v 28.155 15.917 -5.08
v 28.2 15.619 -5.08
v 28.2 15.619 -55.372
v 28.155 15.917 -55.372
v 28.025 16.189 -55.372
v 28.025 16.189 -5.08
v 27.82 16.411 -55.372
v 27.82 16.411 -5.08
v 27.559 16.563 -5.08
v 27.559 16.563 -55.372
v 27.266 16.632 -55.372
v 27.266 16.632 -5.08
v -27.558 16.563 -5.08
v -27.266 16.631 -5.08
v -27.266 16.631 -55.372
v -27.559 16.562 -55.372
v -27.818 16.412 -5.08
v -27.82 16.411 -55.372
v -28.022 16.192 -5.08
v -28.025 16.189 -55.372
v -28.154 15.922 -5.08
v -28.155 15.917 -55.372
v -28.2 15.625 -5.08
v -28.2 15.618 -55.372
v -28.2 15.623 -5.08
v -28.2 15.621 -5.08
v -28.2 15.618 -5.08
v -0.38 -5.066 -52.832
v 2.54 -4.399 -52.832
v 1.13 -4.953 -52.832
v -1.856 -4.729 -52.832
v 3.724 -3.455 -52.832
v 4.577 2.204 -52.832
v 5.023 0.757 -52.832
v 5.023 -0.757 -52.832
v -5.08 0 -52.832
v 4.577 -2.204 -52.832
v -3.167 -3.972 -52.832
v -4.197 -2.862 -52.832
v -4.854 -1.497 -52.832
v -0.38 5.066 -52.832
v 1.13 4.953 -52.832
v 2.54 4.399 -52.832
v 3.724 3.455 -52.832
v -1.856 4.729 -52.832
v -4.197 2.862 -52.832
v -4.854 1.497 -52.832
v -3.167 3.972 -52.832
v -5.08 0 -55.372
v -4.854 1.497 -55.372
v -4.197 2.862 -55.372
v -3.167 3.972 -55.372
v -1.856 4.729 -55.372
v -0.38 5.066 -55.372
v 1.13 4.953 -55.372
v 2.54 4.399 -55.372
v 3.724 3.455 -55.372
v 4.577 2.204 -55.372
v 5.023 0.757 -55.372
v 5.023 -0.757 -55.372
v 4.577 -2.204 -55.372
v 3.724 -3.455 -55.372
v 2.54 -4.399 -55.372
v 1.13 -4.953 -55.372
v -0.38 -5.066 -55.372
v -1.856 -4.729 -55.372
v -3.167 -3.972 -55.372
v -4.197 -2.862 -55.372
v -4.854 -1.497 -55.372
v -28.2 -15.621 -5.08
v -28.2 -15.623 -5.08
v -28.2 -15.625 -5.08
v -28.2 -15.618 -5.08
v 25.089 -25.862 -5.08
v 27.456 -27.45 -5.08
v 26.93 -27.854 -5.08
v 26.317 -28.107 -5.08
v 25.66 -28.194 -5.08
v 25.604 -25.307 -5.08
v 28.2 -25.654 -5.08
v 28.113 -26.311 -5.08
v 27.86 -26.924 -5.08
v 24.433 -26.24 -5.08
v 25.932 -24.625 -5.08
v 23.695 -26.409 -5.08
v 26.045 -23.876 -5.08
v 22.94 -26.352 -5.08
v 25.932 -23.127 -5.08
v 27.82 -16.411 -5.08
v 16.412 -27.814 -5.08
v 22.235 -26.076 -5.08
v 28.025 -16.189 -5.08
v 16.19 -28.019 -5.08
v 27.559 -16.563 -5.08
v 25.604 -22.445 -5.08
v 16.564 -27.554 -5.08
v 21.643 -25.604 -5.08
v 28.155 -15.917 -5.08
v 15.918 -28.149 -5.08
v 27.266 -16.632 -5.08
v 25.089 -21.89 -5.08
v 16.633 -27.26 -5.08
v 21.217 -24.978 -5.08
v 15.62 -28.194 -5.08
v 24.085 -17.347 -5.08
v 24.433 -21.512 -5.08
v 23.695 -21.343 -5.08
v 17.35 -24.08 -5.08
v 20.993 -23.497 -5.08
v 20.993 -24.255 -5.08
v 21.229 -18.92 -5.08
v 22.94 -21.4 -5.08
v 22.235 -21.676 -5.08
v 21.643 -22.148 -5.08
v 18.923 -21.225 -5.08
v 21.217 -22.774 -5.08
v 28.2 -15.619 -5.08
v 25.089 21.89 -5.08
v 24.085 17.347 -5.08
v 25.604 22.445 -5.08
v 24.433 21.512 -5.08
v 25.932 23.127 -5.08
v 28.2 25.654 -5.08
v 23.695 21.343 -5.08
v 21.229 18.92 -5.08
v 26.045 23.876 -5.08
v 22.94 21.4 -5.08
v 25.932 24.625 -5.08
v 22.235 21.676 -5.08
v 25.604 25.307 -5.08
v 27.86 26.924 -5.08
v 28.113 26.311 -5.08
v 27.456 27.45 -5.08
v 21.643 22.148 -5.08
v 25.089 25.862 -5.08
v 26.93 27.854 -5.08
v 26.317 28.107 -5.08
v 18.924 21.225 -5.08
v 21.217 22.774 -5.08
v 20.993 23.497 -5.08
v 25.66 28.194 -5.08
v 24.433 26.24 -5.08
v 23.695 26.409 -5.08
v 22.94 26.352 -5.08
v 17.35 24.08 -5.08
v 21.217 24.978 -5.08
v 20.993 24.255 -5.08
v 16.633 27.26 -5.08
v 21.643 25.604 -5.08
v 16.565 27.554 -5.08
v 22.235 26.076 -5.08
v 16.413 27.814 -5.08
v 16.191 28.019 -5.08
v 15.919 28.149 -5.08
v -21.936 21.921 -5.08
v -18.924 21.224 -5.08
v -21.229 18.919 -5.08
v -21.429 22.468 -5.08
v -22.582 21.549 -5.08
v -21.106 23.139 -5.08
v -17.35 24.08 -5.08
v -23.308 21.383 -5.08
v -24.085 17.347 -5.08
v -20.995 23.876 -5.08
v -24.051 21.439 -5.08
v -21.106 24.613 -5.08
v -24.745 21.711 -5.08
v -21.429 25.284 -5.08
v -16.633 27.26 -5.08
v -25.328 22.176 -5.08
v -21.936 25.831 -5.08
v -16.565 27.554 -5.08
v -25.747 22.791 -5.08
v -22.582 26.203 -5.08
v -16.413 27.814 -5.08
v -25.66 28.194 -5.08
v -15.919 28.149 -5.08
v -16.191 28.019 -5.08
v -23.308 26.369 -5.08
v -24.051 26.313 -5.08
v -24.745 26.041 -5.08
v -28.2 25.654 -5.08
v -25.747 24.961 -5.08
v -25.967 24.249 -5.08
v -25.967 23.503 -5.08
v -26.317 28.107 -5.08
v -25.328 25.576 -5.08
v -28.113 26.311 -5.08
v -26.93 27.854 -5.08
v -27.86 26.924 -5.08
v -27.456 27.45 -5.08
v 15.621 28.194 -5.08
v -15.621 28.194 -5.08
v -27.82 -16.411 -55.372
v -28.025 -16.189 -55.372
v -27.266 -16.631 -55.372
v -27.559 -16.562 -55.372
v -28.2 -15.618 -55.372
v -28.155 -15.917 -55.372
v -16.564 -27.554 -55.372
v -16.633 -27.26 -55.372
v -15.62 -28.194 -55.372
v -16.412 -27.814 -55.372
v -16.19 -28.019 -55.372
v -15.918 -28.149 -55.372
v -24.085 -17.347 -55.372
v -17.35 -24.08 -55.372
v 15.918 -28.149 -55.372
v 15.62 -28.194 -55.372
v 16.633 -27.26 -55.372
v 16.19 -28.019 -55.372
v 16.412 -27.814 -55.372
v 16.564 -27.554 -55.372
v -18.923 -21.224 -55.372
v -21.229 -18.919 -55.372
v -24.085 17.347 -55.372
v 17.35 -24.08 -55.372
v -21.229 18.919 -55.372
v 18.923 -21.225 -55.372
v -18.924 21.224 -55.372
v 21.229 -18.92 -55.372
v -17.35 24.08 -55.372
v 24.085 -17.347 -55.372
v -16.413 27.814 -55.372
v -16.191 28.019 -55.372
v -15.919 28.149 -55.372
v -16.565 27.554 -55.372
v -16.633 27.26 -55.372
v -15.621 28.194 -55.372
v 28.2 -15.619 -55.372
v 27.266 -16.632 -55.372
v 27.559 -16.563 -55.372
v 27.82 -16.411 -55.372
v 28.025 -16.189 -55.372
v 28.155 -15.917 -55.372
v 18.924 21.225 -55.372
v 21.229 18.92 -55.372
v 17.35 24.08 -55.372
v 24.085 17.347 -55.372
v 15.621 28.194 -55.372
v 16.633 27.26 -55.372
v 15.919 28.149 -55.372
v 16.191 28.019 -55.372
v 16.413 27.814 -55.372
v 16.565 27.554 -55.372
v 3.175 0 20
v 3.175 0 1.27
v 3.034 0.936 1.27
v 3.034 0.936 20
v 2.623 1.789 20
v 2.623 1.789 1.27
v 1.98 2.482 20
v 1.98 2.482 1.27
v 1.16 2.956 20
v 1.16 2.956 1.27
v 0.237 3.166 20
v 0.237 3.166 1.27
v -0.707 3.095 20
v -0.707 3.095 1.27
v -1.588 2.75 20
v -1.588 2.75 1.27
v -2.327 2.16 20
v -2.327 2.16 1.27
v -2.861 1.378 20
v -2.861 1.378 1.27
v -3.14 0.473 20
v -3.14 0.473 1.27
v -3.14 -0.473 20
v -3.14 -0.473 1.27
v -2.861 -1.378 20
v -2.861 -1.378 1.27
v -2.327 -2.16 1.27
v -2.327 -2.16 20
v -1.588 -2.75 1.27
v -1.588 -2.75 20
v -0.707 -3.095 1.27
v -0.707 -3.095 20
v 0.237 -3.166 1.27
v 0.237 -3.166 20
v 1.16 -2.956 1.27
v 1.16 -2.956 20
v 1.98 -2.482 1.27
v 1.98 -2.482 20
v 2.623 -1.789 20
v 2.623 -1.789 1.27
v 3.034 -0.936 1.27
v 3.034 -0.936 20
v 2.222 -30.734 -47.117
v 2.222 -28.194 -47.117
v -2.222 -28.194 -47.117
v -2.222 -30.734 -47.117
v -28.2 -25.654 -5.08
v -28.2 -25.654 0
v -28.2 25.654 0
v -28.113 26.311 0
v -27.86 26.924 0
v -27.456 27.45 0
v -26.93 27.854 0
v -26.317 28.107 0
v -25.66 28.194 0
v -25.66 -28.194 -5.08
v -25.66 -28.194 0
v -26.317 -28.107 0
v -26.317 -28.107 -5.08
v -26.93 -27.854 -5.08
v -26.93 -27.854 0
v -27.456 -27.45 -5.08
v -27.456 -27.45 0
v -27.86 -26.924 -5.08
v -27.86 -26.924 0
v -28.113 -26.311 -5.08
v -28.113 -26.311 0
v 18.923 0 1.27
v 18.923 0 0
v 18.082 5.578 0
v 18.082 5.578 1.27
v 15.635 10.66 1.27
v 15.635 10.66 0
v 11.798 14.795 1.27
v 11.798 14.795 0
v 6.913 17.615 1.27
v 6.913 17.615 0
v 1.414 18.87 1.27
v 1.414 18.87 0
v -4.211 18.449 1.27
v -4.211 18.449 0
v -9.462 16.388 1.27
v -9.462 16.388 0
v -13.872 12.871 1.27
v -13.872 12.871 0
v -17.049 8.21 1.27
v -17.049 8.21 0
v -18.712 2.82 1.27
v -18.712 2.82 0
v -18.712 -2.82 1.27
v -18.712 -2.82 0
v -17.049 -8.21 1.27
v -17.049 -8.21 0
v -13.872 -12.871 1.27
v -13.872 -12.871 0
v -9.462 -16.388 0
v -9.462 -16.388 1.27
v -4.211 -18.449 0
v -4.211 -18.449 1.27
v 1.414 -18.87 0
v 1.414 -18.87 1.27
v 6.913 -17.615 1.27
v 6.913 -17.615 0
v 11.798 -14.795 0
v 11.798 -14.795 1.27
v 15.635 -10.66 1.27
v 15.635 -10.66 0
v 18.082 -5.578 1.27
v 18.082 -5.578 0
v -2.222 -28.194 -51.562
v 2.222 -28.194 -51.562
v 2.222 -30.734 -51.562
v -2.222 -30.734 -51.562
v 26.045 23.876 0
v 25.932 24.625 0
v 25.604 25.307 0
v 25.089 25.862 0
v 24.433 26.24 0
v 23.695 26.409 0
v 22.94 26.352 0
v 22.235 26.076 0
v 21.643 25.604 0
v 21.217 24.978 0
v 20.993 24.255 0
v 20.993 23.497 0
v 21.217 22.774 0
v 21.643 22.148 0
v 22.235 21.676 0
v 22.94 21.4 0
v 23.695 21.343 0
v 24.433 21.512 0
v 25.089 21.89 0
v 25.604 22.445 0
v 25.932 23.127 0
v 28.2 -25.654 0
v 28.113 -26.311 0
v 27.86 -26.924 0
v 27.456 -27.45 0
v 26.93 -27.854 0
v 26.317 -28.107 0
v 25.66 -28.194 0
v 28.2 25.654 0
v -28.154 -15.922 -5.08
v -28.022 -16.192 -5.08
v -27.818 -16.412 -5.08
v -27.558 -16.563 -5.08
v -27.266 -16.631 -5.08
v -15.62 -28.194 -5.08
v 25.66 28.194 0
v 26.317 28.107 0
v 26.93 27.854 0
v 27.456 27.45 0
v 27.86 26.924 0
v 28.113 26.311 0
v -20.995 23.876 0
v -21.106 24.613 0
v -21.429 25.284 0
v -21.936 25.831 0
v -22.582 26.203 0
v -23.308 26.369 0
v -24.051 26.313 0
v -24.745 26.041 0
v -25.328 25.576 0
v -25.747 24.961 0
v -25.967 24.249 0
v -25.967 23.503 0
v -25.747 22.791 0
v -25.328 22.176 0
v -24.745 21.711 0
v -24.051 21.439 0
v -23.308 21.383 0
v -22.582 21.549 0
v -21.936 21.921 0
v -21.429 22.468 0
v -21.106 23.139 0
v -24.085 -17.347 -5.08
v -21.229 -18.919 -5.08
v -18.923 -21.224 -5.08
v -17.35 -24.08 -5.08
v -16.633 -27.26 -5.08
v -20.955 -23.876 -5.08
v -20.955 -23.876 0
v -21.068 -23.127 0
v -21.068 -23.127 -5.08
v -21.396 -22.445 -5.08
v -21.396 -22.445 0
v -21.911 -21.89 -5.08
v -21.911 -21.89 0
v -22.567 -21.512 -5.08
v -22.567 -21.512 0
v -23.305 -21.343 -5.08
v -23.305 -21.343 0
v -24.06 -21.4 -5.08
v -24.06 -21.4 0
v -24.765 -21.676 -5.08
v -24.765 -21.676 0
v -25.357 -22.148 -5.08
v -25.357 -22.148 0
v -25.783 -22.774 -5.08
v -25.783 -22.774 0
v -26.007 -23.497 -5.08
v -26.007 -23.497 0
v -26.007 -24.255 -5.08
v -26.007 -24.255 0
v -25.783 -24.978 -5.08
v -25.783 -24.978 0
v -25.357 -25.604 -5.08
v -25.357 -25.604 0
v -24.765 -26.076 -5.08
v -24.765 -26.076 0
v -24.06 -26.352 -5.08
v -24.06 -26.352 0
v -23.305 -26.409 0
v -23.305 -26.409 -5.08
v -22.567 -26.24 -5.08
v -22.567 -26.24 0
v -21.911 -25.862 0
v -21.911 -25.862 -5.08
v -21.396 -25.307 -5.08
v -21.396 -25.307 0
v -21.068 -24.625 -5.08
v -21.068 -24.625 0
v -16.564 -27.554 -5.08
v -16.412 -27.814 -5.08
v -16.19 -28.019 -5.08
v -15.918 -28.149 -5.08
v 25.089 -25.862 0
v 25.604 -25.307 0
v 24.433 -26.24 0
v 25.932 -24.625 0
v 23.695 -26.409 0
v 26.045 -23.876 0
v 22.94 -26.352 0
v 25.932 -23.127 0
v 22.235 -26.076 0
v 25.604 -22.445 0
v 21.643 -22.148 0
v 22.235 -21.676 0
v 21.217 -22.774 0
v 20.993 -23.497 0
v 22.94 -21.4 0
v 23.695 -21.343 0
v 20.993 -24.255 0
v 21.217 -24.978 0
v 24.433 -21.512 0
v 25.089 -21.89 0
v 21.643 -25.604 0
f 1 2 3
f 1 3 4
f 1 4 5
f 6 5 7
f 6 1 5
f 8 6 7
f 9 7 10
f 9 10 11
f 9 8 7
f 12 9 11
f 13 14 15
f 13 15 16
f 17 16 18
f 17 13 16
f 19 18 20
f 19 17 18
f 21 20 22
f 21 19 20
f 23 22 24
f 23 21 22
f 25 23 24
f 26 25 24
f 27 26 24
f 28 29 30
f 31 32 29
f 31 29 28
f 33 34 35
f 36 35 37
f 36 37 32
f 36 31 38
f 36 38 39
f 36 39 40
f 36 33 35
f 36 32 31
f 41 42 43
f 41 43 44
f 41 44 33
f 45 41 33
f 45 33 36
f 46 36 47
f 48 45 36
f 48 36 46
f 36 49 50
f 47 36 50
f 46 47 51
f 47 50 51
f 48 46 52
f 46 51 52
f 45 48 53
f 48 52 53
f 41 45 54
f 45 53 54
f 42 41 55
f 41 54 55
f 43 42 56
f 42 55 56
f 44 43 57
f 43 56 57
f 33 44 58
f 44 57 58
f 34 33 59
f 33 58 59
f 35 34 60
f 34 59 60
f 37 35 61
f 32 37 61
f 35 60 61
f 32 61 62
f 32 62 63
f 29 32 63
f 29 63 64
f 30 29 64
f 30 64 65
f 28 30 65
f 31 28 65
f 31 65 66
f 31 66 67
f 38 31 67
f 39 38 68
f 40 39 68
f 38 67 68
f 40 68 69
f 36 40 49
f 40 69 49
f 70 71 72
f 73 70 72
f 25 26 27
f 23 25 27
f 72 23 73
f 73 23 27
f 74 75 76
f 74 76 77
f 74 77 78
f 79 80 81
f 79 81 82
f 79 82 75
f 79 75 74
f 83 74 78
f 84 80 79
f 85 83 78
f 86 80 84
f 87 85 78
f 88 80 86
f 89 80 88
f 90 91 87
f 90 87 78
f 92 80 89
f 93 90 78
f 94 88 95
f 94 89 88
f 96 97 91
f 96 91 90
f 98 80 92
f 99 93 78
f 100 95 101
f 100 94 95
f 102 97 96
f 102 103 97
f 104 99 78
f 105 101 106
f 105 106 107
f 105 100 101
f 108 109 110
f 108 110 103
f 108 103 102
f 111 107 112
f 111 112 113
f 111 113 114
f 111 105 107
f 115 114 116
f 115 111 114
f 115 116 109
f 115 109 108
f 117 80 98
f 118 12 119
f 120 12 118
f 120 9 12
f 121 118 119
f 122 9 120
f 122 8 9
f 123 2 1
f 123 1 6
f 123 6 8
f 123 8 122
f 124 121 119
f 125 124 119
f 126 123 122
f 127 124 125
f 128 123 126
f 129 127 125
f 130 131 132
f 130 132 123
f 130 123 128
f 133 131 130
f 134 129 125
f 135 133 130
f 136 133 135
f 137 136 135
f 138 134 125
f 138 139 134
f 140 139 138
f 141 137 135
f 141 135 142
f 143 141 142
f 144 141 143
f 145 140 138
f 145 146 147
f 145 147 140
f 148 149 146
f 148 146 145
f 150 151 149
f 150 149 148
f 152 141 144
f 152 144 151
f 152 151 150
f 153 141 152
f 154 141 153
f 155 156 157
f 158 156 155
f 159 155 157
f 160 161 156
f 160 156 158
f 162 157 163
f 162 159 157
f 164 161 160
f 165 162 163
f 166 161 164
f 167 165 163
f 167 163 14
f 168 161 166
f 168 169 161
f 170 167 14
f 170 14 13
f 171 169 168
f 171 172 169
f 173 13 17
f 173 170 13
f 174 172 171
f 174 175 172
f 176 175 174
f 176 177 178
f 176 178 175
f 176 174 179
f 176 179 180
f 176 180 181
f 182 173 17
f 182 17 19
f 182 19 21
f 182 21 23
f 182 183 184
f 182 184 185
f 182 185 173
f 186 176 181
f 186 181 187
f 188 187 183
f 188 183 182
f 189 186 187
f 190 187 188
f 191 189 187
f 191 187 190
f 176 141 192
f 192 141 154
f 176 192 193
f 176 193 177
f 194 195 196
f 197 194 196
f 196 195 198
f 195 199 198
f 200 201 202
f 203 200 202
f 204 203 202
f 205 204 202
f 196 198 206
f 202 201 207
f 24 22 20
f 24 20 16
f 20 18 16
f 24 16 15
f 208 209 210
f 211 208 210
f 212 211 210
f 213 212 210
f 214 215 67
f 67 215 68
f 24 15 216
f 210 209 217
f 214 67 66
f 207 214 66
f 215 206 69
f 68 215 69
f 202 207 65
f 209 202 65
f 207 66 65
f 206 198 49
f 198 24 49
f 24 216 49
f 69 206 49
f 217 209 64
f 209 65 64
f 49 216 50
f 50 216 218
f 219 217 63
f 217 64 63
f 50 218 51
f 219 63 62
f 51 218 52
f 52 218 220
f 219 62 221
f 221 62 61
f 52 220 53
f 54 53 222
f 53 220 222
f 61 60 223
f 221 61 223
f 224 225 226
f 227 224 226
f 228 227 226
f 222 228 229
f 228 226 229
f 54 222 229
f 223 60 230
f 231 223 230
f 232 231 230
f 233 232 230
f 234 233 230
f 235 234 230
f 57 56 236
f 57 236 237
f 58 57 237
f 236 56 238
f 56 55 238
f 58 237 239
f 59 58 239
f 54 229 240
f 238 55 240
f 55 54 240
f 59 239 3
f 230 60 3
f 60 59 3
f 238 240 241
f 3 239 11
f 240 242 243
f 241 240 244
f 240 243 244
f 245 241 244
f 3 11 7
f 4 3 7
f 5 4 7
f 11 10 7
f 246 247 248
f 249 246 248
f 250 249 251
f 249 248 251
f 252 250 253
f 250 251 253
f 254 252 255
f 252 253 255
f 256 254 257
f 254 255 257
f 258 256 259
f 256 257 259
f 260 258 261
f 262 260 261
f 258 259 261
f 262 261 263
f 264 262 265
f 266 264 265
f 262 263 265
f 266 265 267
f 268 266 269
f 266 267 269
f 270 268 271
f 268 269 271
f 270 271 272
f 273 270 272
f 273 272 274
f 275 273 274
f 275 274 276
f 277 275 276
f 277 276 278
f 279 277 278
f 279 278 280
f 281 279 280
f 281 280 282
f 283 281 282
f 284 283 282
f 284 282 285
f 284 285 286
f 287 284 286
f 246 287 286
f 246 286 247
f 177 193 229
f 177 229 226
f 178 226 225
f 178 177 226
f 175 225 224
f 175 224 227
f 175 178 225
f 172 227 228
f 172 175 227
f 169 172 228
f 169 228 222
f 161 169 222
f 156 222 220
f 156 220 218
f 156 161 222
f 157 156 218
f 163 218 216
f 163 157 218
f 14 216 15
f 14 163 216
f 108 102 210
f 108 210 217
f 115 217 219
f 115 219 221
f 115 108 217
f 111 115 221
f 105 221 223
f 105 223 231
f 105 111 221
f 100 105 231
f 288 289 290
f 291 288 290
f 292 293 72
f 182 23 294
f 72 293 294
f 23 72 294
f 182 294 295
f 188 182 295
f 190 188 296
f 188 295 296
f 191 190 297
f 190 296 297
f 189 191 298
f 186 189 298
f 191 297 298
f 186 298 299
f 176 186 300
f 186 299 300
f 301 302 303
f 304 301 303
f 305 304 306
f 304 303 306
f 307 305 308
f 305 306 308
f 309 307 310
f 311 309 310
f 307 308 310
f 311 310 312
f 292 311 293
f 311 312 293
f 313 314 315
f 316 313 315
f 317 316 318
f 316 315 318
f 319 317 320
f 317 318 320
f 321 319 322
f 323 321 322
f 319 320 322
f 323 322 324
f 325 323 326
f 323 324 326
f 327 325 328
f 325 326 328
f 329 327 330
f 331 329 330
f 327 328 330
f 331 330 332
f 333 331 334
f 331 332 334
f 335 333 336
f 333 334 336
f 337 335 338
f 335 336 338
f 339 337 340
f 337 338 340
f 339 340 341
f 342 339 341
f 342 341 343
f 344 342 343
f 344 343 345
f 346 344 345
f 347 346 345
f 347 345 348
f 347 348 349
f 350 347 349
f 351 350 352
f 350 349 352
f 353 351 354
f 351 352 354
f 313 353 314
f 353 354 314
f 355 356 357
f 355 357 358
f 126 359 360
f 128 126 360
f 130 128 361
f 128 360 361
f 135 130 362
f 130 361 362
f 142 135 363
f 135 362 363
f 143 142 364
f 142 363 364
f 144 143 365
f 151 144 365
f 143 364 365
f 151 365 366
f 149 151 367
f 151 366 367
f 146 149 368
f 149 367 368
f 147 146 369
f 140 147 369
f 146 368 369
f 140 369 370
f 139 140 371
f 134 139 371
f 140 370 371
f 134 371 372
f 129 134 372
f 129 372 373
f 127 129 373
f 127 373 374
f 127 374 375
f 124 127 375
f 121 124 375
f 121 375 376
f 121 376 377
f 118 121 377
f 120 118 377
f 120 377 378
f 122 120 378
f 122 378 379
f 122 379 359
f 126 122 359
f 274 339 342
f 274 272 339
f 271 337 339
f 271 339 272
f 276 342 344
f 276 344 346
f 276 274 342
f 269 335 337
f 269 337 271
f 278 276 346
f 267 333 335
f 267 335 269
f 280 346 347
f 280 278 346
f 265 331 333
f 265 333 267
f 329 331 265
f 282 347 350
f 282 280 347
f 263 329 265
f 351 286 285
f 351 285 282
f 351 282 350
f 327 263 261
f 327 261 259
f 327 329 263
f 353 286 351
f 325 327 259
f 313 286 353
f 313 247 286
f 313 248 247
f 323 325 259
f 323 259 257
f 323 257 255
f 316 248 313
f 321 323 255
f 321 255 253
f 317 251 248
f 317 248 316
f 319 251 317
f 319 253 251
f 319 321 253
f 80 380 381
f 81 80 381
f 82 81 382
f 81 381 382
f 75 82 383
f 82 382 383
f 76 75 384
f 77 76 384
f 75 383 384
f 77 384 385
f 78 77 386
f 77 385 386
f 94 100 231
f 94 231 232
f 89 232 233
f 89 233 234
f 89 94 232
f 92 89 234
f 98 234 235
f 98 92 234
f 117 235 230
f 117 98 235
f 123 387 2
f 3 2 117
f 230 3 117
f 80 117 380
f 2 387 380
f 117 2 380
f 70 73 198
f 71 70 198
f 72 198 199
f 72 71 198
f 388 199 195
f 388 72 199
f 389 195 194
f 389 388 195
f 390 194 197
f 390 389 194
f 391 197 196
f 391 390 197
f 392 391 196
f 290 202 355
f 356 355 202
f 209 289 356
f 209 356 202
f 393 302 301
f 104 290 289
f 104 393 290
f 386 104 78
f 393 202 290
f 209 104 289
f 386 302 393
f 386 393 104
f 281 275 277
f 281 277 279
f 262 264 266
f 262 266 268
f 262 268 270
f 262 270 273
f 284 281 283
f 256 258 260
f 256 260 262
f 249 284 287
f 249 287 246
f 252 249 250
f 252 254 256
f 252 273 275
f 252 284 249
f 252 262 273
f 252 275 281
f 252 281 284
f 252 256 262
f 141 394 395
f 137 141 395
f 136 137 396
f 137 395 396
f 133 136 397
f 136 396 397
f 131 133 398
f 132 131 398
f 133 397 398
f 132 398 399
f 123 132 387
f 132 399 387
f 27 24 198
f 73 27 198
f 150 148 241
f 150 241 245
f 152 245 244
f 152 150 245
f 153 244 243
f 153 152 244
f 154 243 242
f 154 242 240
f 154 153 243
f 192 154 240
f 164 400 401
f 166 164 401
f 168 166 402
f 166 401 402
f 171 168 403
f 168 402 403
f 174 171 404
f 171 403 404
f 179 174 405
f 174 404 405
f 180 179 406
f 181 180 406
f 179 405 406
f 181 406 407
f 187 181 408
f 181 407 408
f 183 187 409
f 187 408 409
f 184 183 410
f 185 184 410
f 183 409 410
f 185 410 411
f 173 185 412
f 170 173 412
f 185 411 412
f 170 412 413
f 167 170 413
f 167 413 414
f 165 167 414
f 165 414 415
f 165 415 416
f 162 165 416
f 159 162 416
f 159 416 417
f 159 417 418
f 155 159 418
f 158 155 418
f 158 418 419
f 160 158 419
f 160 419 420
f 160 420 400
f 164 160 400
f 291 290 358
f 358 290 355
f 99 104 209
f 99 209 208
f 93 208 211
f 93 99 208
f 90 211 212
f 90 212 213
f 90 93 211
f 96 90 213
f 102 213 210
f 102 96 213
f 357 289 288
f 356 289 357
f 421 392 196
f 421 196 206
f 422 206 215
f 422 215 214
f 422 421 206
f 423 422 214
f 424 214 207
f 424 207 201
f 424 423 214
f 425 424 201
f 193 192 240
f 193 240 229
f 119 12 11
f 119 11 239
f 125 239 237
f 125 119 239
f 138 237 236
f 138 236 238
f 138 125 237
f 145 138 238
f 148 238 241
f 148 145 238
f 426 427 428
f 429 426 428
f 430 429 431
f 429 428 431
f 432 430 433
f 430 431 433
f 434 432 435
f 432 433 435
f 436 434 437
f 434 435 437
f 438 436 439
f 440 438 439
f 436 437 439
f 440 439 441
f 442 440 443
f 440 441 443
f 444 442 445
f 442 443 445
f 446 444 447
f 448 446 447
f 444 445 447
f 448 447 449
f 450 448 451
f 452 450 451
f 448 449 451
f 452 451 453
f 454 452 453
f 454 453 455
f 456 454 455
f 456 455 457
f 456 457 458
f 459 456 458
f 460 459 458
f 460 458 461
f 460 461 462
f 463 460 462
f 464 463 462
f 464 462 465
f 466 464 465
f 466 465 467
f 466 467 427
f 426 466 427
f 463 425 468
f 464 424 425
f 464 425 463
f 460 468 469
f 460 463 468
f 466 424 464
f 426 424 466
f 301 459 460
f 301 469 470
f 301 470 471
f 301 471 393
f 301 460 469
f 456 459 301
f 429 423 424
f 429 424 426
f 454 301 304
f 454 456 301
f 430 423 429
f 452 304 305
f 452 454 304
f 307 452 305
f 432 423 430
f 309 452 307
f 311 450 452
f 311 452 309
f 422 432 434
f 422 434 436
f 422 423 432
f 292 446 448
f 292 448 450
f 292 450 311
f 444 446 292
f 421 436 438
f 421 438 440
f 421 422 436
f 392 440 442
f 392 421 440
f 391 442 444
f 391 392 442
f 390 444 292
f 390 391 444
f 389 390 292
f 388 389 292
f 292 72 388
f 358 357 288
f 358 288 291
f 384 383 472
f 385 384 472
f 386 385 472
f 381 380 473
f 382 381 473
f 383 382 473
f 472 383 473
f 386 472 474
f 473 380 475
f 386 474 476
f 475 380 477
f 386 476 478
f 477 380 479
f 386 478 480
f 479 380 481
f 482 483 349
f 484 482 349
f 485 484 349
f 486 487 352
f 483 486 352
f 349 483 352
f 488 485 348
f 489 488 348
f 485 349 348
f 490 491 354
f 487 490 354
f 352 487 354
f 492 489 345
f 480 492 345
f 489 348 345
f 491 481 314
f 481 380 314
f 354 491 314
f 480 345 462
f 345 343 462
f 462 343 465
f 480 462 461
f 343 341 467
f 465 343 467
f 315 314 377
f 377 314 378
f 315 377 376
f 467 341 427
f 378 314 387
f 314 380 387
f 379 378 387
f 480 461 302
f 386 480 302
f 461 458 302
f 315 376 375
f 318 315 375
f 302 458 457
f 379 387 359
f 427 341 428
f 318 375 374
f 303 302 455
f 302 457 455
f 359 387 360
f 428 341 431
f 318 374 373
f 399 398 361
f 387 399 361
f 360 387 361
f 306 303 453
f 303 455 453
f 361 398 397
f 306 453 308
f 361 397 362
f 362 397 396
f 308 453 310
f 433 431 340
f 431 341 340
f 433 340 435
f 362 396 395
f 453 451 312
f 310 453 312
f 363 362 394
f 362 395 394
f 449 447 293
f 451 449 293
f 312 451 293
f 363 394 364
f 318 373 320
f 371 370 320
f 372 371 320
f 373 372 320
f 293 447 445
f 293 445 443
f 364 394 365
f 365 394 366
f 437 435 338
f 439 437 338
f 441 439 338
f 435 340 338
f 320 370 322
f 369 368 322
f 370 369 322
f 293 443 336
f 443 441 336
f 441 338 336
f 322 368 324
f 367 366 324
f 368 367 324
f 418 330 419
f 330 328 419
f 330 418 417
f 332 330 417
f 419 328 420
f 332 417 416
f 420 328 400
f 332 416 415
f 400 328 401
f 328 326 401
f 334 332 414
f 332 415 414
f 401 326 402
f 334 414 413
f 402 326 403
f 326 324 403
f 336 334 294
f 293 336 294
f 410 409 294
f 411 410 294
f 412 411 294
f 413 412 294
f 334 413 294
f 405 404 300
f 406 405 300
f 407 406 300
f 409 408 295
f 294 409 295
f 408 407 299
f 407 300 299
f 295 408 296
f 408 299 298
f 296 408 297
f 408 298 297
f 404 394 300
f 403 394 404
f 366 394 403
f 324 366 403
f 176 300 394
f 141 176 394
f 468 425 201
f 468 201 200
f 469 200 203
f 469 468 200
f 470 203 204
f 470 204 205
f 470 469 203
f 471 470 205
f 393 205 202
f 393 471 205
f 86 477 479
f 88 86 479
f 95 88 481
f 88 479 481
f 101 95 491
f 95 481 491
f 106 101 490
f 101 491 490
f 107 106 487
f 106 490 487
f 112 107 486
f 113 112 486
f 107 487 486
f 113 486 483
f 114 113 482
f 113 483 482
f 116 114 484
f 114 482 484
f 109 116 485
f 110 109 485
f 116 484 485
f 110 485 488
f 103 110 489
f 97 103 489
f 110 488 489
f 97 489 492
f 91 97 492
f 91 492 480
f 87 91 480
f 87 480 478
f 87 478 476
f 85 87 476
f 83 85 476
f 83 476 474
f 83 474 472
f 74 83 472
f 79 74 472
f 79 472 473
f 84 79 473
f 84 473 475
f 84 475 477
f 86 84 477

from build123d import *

# Parameters (mm, degrees)
BOSS_EXTRUDE1_DEPTH = 5.08
SKETCH2_R           = 2.5
SKETCH2_R_2         = 2.54
CUT_EXTRUDE1_DEPTH  = 12.7
SKETCH3_R           = 3.175
BOSS_EXTRUDE2_DEPTH = 20
BOSS_EXTRUDE3_DEPTH = 50.292
SKETCH7_R           = 5.08
CUT_EXTRUDE2_DEPTH  = 2.54
SKETCH8_W           = 4.445
SKETCH8_H           = 4.445
BOSS_EXTRUDE4_DEPTH = 2.54
SKETCH9_R           = 18.923
BOSS_EXTRUDE5_DEPTH = 1.27


with BuildPart() as part:
    # Sketch1 → Boss-Extrude1 (new body)
    with BuildSketch(Plane.XY):
        with BuildLine():
            Line((-25.66, 28.194), (25.66, 28.194))
            ThreePointArc((25.66, 28.194), (27.456051224, 27.450051224), (28.2, 25.654))
            Line((28.2, 25.654), (28.2, -25.654))
            ThreePointArc((28.2, -25.654), (27.456051224, -27.450051224), (25.66, -28.194))
            Line((25.66, -28.194), (-25.66, -28.194))
            ThreePointArc((-25.66, -28.194), (-27.456051224, -27.450051224), (-28.2, -25.654))
            Line((-28.2, -25.654), (-28.2, 25.654))
            ThreePointArc((-28.2, 25.654), (-27.456051224, 27.450051224), (-25.66, 28.194))
        make_face()
    extrude(amount=-BOSS_EXTRUDE1_DEPTH)

    # Sketch2 → Cut-Extrude1 (cut)
    with BuildSketch(Plane.XY):
        with Locations((-23.495, 23.876)):
            Circle(SKETCH2_R)
        with Locations((23.505, 23.876)):
            Circle(SKETCH2_R_2)
        with Locations((-23.495, -23.876)):
            Circle(SKETCH2_R_2)
        with Locations((23.505, -23.876)):
            Circle(SKETCH2_R_2)
    extrude(amount=-CUT_EXTRUDE1_DEPTH, mode=Mode.SUBTRACT)

    # Sketch3 → Boss-Extrude2 (add)
    with BuildSketch(Plane.XY):
        Circle(SKETCH3_R)
    extrude(amount=BOSS_EXTRUDE2_DEPTH)

    # Sketch6 → Boss-Extrude3 (add)
    with BuildSketch(Plane(origin=(0, 0, -5.08), x_dir=(-1, 0, 0), z_dir=(0, 0, -1))):
        with BuildLine():
            Line((-15.620607632, 28.193981005), (15.620607632, 28.193981005))
            ThreePointArc((15.620607632, 28.193981005), (16.309436696, 27.924821363), (16.633295319, 27.25995447))
            ThreePointArc((16.633295319, 27.25995447), (19.995115916, 19.990526597), (27.265660549, 16.631121879))
            ThreePointArc((27.265660549, 16.631121879), (27.930749509, 16.307360153), (28.200023614, 15.618407008))
            Line((28.200023614, 15.618407008), (28.200023614, -15.618407008))
            ThreePointArc((28.200023614, -15.618407008), (27.930742821, -16.307367402), (27.265640888, -16.631123464))
            ThreePointArc((27.265640888, -16.631123464), (19.994877492, -19.99046435), (16.632859418, -27.259990196))
            ThreePointArc((16.632859418, -27.259990196), (16.308995981, -27.924846048), (15.620173086, -28.194))
            Line((15.620173086, -28.194), (-15.620173086, -28.194))
            ThreePointArc((-15.620173086, -28.194), (-16.308986965, -27.924854363), (-16.632857438, -27.260014646))
            ThreePointArc((-16.632857438, -27.260014646), (-19.994954858, -19.990760744), (-27.265596467, -16.631665336))
            ThreePointArc((-27.265596467, -16.631665336), (-27.93071213, -16.307915269), (-28.2, -15.618947204))
            Line((-28.2, -15.618947204), (-28.2, 15.618947204))
            ThreePointArc((-28.2, 15.618947204), (-27.930718818, 16.30790802), (-27.265616128, 16.631663752))
            ThreePointArc((-27.265616128, 16.631663752), (-19.995193282, 19.990822991), (-16.633293339, 27.25997892))
            ThreePointArc((-16.633293339, 27.25997892), (-16.30942768, 27.924829678), (-15.620607632, 28.193981005))
        make_face()
    extrude(amount=BOSS_EXTRUDE3_DEPTH)

    # Sketch7 → Cut-Extrude2 (cut)
    with BuildSketch(Plane(origin=(0, 0, -55.372), x_dir=(-1, 0, 0), z_dir=(0, 0, -1))):
        Circle(SKETCH7_R)
    extrude(amount=-CUT_EXTRUDE2_DEPTH, mode=Mode.SUBTRACT)

    # Sketch8 → Boss-Extrude4 (add)
    with BuildSketch(Plane(origin=(0, -28.194, 0), x_dir=(-1, 0, 0), z_dir=(0, -1, 0))):
        with Locations((0, 49.3395)):
            Rectangle(SKETCH8_W, SKETCH8_H)
    extrude(amount=BOSS_EXTRUDE4_DEPTH)

    # Sketch9 → Boss-Extrude5 (add)
    with BuildSketch(Plane.XY):
        Circle(SKETCH9_R)
    extrude(amount=BOSS_EXTRUDE5_DEPTH)


solid = part.part
